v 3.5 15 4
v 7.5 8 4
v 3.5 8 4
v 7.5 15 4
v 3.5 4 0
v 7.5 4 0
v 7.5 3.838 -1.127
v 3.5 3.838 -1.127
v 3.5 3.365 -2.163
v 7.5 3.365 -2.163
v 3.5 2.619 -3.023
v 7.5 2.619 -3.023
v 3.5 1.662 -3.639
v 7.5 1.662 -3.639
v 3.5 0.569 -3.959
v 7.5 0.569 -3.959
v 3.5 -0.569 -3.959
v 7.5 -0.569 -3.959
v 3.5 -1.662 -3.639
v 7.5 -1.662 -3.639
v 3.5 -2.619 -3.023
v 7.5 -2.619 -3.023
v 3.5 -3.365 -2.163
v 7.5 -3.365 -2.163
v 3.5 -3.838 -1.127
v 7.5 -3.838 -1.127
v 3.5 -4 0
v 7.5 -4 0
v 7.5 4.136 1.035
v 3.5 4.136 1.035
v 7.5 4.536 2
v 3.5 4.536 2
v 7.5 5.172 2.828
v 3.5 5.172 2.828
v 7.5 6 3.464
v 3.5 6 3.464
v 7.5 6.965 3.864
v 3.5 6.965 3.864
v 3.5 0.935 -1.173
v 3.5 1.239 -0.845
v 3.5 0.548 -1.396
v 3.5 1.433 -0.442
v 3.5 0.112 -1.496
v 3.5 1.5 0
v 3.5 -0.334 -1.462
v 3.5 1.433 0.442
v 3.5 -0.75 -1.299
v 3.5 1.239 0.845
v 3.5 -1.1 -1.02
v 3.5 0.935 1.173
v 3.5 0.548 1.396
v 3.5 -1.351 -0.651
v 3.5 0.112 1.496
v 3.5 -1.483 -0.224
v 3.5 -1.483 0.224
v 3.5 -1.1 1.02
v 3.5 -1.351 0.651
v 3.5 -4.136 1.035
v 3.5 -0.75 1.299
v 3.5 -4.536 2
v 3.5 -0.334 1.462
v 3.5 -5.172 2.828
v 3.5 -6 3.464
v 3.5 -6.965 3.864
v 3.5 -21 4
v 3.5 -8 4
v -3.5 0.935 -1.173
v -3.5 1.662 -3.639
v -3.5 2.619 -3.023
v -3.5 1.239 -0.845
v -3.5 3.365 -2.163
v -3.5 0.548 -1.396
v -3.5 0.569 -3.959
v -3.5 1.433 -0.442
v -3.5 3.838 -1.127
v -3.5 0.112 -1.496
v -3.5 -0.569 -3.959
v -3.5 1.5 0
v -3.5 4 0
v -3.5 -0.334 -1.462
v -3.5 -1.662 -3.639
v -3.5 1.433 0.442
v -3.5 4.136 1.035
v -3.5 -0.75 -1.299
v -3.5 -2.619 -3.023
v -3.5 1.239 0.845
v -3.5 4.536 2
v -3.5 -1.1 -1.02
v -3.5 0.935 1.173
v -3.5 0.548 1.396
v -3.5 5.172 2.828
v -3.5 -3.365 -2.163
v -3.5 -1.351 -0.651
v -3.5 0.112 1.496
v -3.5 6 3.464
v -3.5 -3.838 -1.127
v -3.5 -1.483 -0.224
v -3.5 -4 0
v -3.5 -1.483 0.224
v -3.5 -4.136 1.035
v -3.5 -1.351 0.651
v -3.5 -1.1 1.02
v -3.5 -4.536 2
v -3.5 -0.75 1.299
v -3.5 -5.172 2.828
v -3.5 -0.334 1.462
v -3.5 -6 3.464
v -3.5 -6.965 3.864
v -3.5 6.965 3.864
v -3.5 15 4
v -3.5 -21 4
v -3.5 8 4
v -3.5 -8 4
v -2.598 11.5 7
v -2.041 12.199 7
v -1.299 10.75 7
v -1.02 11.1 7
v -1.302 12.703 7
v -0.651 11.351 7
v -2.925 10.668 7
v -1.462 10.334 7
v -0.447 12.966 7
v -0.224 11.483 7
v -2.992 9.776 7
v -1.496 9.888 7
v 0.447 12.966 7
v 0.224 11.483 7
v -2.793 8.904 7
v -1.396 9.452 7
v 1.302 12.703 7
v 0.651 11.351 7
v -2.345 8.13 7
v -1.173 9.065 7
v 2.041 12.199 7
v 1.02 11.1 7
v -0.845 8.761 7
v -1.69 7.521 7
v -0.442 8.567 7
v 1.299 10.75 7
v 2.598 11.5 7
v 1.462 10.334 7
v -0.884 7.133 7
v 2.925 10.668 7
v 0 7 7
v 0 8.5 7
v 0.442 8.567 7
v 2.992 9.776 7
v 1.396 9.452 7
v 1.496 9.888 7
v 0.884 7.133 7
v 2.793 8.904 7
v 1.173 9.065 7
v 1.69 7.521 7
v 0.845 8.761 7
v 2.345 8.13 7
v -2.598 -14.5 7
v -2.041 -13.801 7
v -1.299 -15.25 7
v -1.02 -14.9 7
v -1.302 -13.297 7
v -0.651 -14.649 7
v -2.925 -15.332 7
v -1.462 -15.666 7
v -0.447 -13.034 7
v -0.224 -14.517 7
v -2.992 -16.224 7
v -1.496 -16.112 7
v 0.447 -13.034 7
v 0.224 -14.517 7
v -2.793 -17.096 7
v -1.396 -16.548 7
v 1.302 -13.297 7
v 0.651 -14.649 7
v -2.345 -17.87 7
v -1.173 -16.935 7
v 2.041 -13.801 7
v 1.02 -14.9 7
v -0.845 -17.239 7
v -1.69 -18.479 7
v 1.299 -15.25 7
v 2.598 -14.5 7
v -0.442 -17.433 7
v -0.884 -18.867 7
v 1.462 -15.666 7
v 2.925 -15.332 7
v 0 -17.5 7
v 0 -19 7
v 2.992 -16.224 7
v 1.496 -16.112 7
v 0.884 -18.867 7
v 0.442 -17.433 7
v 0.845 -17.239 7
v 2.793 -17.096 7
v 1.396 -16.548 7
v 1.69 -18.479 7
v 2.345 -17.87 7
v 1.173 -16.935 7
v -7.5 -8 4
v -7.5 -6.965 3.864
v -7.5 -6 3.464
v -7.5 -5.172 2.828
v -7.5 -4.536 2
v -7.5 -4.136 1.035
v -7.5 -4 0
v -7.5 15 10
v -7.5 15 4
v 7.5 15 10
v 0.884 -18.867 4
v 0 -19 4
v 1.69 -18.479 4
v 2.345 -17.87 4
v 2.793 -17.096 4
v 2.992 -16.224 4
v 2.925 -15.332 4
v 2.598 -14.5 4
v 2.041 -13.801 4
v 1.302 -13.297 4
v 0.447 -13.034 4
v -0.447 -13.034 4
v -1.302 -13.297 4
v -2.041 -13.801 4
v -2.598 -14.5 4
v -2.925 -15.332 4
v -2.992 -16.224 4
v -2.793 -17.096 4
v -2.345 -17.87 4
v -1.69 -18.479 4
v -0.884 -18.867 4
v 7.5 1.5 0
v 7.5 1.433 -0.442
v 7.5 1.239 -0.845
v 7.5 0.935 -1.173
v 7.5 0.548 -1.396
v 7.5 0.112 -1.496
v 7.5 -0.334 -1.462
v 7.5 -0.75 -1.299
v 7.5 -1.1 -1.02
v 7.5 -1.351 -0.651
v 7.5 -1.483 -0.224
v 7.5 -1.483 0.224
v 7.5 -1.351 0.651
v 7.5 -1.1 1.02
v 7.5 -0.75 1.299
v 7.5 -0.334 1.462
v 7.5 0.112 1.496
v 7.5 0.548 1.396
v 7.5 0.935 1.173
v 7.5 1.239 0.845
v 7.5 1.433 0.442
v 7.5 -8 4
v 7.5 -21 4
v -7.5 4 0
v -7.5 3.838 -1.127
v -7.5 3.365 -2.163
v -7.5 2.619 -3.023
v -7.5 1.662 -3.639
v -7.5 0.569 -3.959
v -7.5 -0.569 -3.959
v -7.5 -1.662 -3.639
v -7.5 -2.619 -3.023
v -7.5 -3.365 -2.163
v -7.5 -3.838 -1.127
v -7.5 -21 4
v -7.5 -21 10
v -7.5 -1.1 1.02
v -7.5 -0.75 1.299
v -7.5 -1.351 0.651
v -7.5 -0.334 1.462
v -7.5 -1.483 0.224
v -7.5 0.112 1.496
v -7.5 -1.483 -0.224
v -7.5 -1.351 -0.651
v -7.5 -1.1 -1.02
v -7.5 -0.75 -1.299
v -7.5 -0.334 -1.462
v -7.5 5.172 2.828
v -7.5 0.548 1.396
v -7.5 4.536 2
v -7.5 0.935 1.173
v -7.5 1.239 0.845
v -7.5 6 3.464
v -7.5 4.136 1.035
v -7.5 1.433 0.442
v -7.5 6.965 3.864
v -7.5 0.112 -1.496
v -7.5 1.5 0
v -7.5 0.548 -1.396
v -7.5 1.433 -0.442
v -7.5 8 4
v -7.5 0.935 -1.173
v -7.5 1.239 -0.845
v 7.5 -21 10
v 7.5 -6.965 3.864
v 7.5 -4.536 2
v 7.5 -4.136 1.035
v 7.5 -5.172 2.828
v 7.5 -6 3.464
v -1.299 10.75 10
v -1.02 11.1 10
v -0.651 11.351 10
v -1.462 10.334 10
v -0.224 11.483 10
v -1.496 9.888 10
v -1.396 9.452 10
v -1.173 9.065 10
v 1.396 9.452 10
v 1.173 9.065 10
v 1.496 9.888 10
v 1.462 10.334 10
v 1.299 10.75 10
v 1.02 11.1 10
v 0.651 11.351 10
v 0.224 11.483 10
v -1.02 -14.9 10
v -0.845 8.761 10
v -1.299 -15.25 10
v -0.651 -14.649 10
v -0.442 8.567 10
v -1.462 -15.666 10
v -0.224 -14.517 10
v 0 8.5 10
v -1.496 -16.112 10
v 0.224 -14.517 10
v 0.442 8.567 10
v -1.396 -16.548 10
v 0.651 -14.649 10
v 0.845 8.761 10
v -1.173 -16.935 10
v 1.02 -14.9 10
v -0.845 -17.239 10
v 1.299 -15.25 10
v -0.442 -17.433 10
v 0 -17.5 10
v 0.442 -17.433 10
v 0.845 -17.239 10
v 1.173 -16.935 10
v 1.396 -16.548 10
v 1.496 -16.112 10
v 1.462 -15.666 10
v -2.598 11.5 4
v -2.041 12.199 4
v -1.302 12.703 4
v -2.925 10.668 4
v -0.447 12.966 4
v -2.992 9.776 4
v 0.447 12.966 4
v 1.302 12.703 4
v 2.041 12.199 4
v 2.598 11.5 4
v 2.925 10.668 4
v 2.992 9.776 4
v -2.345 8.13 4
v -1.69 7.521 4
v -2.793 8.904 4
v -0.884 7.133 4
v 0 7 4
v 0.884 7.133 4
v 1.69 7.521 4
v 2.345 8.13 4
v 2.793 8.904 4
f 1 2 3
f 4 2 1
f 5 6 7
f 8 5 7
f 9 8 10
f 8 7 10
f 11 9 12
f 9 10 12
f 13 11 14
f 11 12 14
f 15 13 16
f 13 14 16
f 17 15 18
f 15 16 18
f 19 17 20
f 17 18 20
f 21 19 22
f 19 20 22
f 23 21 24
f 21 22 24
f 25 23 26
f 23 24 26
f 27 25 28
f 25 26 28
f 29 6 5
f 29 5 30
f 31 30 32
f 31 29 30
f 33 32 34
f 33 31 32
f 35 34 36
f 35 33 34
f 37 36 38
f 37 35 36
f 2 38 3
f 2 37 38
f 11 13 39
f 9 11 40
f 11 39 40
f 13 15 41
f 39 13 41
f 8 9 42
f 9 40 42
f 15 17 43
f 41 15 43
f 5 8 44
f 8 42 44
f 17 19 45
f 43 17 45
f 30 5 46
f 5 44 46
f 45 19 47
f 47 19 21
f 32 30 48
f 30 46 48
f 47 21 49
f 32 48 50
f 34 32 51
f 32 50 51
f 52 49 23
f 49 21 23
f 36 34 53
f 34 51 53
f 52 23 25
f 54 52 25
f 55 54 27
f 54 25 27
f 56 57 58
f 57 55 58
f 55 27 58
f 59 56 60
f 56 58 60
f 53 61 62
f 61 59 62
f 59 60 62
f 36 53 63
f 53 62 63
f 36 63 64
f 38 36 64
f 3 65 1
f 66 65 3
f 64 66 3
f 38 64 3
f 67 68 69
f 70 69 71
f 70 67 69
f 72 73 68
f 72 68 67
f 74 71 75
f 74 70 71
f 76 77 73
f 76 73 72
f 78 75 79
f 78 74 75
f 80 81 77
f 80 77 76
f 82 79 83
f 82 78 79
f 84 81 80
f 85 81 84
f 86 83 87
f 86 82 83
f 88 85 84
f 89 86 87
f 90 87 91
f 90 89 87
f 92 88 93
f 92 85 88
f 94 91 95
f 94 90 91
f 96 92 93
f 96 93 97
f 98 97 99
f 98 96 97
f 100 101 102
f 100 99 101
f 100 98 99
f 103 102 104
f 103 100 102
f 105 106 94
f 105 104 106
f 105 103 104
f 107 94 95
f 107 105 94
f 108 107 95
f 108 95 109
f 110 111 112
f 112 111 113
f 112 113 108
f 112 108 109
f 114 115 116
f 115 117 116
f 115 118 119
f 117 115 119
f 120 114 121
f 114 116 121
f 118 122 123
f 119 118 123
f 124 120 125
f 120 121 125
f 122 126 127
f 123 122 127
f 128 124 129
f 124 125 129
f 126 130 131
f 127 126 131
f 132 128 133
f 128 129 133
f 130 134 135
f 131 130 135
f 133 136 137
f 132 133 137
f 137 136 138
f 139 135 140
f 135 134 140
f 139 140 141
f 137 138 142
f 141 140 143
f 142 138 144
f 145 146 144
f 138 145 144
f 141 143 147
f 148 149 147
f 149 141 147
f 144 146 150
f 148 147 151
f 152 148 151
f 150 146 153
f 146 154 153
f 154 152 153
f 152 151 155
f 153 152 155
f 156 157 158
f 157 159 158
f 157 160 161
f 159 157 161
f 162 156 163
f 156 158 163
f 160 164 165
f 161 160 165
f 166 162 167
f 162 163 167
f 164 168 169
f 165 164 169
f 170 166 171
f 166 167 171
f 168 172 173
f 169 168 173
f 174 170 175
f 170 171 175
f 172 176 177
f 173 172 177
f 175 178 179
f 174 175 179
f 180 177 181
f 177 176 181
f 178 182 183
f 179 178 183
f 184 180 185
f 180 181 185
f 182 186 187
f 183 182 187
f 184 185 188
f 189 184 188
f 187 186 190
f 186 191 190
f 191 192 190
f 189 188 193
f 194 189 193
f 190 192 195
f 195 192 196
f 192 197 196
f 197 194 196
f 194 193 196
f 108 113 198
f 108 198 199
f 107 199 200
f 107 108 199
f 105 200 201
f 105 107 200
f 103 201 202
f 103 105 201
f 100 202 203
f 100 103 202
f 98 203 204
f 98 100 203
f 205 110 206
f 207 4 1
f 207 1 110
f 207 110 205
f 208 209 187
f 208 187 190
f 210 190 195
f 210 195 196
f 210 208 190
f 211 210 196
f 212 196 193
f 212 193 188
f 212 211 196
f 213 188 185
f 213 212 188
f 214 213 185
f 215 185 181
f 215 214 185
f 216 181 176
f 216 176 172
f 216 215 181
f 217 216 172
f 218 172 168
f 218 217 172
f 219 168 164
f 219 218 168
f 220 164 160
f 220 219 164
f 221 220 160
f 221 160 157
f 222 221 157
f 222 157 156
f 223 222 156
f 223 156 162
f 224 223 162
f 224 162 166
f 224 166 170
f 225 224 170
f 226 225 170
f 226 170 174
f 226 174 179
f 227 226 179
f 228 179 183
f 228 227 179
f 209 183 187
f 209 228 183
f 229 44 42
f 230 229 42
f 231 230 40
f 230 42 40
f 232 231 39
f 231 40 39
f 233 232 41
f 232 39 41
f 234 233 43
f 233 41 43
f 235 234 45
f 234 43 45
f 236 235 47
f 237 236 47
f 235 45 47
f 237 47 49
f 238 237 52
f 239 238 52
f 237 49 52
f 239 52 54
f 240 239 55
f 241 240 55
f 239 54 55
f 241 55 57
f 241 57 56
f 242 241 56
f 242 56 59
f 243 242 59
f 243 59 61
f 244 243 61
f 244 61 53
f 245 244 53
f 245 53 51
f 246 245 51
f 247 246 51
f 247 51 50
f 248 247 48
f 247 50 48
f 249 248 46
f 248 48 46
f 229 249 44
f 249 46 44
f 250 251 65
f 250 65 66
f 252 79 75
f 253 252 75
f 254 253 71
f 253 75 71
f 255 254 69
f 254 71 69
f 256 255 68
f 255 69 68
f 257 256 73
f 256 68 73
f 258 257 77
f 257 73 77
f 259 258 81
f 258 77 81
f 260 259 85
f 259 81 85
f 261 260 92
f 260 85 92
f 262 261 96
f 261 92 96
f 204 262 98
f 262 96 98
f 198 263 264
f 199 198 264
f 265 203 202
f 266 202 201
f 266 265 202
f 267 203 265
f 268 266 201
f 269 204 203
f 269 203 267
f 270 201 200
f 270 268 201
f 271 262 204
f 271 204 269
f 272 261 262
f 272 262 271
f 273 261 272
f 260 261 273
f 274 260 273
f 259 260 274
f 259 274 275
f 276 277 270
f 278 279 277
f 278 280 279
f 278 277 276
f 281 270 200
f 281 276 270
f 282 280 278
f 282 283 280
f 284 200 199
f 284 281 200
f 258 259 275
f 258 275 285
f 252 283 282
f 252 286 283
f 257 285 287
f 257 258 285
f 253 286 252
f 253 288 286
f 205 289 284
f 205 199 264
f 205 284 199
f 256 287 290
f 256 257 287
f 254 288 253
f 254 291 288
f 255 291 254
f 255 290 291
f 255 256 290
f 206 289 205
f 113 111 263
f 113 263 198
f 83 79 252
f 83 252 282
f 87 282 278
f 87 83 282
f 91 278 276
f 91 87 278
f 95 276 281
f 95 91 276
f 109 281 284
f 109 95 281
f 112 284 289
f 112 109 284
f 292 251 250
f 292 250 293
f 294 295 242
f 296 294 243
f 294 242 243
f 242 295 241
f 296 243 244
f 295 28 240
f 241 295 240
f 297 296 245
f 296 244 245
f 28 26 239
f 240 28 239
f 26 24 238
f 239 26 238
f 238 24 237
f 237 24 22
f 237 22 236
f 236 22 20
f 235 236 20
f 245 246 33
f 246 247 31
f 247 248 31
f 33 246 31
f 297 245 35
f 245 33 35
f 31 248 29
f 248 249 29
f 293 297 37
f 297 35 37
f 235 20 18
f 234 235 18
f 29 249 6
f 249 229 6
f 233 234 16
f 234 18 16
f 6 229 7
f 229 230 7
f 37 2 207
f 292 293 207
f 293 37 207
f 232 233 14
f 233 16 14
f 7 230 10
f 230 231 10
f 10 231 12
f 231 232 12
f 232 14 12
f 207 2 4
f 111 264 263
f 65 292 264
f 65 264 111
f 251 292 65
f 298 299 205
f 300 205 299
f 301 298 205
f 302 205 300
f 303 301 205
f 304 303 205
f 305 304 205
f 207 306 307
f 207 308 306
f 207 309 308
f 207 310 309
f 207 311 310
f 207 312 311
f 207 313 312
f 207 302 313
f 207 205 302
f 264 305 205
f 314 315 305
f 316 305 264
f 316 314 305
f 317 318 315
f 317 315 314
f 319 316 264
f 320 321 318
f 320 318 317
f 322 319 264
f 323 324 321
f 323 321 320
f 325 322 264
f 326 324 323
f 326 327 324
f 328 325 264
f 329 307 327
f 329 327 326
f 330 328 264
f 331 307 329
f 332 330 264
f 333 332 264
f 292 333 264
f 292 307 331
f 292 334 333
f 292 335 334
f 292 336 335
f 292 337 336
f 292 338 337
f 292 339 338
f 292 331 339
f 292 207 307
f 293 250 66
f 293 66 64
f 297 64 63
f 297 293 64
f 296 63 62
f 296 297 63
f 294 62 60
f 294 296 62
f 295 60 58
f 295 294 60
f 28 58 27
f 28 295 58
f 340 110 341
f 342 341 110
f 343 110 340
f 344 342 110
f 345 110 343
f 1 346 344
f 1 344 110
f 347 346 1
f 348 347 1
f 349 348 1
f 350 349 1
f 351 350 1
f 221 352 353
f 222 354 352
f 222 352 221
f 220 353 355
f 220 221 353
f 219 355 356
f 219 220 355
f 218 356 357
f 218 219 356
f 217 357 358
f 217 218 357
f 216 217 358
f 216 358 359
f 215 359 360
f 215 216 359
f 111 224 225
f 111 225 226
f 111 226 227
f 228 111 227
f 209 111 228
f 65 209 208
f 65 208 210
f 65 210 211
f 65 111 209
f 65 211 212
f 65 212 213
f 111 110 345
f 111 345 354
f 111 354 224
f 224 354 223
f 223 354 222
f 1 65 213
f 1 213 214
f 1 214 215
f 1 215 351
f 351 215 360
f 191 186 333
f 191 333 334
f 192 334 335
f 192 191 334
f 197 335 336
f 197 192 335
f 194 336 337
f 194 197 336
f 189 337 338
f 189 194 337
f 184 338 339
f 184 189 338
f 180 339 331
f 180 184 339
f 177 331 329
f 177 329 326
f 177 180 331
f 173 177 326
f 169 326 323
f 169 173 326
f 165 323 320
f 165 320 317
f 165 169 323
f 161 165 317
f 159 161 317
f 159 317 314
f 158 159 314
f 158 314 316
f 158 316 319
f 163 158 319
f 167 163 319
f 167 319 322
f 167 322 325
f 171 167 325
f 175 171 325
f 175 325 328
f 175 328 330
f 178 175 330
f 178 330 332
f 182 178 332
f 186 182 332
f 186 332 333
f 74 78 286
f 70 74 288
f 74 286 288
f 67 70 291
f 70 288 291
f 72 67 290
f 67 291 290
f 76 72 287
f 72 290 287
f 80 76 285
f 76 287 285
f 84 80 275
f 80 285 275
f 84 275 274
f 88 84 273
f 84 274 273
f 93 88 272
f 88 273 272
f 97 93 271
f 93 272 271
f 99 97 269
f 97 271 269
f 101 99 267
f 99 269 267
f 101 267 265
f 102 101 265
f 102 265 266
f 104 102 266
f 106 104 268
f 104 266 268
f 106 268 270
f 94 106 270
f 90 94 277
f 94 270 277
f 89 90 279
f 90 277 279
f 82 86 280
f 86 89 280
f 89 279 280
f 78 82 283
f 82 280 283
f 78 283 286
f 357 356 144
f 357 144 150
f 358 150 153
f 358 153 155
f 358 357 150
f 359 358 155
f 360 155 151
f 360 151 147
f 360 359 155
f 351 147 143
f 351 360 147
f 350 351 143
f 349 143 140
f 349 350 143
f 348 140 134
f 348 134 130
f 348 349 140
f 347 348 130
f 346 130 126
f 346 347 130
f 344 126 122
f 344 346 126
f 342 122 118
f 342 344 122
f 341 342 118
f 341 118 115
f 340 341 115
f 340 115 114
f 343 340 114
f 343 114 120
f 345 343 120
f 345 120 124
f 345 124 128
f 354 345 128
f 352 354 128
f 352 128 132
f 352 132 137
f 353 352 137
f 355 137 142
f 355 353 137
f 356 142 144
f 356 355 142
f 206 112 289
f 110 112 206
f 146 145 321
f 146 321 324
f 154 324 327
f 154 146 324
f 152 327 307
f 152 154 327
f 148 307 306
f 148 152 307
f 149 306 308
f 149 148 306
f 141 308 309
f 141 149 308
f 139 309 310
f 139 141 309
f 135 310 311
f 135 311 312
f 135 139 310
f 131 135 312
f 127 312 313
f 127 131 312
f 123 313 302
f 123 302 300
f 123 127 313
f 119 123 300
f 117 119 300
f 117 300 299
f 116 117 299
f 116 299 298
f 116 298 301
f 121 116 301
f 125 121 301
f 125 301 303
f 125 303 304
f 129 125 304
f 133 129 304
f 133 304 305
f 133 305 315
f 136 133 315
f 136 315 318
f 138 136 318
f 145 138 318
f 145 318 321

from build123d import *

# Parameters (mm, degrees)
SKETCH007_R     = 1.5
PAD002_DEPTH    = 7.5
SKETCH008_W     = 17.891225
SKETCH008_H     = 7
POCKET005_DEPTH = 36.001
SKETCH009_R     = 1.5
POCKET006_DEPTH = 6.001
SKETCH010_R     = 3
POCKET007_DEPTH = 3


with BuildPart() as bottom001:
    # Sketch007 → Pad002 (new body, symmetric)
    with BuildSketch(Plane.YZ):
        with BuildLine():
            ThreePointArc((4, 0), (0, 4), (-4, 0))
            ThreePointArc((-8, -4), (-5.171573, -2.828427), (-4, 0))
            Line((-21, -4), (-8, -4))
            Line((-21, -10), (-21, -4))
            Line((15, -10), (-21, -10))
            Line((15, -4), (15, -10))
            Line((8, -4), (15, -4))
            ThreePointArc((4, 0), (5.171573, -2.828427), (8, -4))
        make_face()
        Circle(SKETCH007_R, mode=Mode.SUBTRACT)
    extrude(amount=PAD002_DEPTH, both=True)

    # Sketch008 (on Face4 of Pad002) → Pocket005 (cut, through all)
    with BuildSketch(Plane(origin=(0, -21, 0), x_dir=(0, 0, -1), z_dir=(0, -1, 0))):
        with Locations((-4.945612, 0)):
            Rectangle(SKETCH008_W, SKETCH008_H)
    extrude(amount=-POCKET005_DEPTH, mode=Mode.SUBTRACT)

    # Sketch009 (on Face16 of Pocket005) → Pocket006 (cut, through all)
    with BuildSketch(Plane(origin=(0, 0, -4), x_dir=(0, -1, 0), z_dir=(0, 0, 1))):
        with Locations((16, 0)):
            Circle(SKETCH009_R)
        with Locations((-10, 0)):
            Circle(SKETCH009_R)
    extrude(amount=-POCKET006_DEPTH, mode=Mode.SUBTRACT)

    # Sketch010 (on Face5 of Pocket006) → Pocket007 (cut)
    with BuildSketch(Plane(origin=(0, 0, -4), x_dir=(0, -1, 0), z_dir=(0, 0, 1))):
        with Locations((-10, 0)):
            Circle(SKETCH010_R)
        with Locations((16, 0)):
            Circle(SKETCH010_R)
    extrude(amount=-POCKET007_DEPTH, mode=Mode.SUBTRACT)


with BuildPart() as part_mirroring001:
    # Part__Mirroring001: instance of Bottom001
    add(bottom001.part.mirror(Plane(origin=(0, 0, 0), x_dir=(0, 1, 0), z_dir=(0, 0, 1))))


solid = part_mirroring001.part
